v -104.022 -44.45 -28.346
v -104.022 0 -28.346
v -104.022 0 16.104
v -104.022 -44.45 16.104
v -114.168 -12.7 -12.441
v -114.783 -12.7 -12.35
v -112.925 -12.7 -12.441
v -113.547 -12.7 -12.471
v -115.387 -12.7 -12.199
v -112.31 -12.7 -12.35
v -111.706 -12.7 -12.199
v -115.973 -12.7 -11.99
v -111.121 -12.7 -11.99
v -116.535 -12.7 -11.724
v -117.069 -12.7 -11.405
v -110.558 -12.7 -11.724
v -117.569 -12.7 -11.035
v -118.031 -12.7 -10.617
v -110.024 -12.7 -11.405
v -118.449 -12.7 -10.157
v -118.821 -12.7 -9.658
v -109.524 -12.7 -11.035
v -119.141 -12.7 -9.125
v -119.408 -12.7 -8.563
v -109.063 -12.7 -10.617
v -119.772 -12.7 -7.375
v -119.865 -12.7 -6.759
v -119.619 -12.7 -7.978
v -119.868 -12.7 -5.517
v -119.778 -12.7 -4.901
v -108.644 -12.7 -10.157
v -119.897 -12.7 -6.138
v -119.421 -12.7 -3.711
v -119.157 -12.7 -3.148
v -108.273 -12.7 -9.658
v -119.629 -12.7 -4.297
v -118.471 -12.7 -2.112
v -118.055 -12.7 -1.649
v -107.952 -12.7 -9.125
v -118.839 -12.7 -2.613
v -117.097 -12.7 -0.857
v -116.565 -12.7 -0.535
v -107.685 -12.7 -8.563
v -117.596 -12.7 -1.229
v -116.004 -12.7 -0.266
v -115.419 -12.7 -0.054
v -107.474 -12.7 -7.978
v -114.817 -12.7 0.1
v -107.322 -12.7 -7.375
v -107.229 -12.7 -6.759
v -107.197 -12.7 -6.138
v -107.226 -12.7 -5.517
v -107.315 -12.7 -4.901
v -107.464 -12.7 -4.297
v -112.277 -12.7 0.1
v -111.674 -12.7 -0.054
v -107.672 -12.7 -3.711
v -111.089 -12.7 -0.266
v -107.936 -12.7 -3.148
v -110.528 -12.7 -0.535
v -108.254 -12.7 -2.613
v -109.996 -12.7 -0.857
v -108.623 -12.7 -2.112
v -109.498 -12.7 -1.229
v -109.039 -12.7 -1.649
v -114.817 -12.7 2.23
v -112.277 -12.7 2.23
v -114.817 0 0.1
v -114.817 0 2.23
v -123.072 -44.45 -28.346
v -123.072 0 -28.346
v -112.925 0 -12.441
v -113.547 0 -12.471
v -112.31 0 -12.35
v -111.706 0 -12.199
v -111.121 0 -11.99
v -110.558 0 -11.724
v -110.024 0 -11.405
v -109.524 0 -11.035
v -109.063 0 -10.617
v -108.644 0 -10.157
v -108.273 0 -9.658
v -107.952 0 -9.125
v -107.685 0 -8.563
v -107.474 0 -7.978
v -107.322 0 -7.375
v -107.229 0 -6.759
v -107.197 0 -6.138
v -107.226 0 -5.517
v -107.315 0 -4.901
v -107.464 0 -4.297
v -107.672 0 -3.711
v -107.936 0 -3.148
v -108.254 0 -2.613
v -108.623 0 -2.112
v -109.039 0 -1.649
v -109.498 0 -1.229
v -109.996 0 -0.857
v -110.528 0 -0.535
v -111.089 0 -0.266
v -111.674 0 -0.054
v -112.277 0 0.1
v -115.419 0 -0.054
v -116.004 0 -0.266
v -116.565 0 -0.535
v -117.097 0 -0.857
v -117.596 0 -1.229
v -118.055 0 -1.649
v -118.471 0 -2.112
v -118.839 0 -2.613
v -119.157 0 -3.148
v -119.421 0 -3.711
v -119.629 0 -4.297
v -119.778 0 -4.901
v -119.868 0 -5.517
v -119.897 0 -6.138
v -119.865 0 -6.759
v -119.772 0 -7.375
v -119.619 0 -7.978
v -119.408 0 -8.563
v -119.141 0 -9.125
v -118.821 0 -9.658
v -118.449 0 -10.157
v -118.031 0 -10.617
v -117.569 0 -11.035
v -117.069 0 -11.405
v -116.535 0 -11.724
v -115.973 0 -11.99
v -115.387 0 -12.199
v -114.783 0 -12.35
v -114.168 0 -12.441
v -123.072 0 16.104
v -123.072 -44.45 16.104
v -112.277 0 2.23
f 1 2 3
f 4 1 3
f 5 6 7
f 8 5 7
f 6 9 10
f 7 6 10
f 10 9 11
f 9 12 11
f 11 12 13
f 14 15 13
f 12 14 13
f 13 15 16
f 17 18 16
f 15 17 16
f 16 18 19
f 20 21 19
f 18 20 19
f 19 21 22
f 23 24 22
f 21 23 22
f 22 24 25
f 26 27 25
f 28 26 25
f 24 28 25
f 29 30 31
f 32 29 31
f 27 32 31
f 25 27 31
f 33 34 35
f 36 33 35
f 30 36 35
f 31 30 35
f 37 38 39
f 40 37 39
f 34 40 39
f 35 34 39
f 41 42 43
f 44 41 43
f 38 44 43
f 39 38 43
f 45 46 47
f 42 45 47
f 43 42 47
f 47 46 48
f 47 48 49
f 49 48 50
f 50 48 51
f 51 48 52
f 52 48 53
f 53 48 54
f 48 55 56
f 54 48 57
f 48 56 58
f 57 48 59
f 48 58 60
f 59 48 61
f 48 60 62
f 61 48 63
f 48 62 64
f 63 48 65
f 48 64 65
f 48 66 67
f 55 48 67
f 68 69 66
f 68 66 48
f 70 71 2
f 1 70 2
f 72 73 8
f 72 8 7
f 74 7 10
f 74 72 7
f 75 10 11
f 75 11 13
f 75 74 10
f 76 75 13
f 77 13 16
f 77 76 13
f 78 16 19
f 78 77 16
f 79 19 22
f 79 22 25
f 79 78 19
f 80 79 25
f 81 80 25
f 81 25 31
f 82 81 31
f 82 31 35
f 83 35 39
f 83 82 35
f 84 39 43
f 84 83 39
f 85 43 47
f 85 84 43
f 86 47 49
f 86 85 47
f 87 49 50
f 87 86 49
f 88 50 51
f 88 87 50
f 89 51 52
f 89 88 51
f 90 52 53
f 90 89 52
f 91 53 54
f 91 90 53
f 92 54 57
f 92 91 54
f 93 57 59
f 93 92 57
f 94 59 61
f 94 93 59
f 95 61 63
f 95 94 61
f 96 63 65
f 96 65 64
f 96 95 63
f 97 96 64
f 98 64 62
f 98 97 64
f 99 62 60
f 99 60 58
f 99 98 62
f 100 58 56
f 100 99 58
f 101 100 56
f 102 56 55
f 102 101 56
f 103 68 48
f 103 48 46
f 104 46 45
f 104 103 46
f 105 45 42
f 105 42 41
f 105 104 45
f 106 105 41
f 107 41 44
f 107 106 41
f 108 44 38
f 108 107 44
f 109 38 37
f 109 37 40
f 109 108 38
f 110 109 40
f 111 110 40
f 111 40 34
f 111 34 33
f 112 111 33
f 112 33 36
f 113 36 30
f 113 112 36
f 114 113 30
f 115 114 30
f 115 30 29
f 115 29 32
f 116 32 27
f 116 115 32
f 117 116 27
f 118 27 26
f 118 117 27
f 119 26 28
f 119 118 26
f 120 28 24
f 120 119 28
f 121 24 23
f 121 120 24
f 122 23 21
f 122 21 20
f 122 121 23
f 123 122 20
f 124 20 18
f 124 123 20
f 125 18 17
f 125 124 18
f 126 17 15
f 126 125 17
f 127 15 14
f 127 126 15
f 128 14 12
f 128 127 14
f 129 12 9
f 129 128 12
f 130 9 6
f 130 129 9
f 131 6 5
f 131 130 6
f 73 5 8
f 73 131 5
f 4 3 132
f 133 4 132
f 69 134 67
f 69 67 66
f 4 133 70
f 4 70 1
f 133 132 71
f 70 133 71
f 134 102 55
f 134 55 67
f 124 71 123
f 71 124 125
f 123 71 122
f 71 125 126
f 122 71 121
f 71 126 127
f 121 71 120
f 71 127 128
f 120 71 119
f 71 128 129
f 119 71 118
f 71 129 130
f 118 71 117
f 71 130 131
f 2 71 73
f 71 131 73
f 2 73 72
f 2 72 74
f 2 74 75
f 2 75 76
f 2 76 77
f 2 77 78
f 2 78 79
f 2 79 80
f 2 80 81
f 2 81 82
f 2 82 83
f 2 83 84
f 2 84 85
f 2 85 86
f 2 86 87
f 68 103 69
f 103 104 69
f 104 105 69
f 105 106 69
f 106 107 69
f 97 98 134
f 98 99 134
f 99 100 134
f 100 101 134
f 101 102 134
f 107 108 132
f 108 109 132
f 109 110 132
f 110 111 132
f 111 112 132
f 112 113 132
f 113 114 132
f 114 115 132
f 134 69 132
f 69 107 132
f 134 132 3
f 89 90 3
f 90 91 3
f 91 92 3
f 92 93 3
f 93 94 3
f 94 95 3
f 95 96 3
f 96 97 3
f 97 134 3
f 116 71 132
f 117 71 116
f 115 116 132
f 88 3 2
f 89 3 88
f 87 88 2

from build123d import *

# Parameters (mm, degrees)
F1_DEPTH = 44.45
F2_DEPTH = 12.7


with BuildPart() as f1:
    # F0 (on Front) → F1 (new body)
    with BuildSketch(Plane.XZ):
        with BuildLine():
            ThreePointArc((-113.546669, -12.471259), (-119.864514, -6.759491), (-114.816669, 0.100445))
            Line((-114.816669, 0.100445), (-114.816669, 2.230411))
            Line((-114.816669, 2.230411), (-113.546669, 2.230411))
            Line((-113.546669, 2.230411), (-113.546669, 16.103741))
            Line((-113.546669, 16.103741), (-123.071669, 16.103741))
            Line((-123.071669, 16.103741), (-123.071669, -28.346259))
            Line((-123.071669, -28.346259), (-113.546669, -28.346259))
            Line((-113.546669, -28.346259), (-113.546669, -12.471259))
        make_face()
        with BuildLine():
            ThreePointArc((-112.276669, 0.100445), (-107.228825, -6.759491), (-113.546669, -12.471259))
            Line((-113.546669, -12.471259), (-113.546669, -28.346259))
            Line((-113.546669, -28.346259), (-104.021669, -28.346259))
            Line((-104.021669, -28.346259), (-104.021669, 16.103741))
            Line((-104.021669, 16.103741), (-113.546669, 16.103741))
            Line((-113.546669, 16.103741), (-113.546669, 2.230411))
            Line((-113.546669, 2.230411), (-112.276669, 2.230411))
            Line((-112.276669, 2.230411), (-112.276669, 0.100445))
        make_face()
        with BuildLine():
            Line((-113.546669, -6.121259), (-113.546669, -12.471259))
            ThreePointArc((-113.546669, -12.471259), (-107.228825, -6.759491), (-112.276669, 0.100445))
            Line((-112.276669, 0.100445), (-112.276669, 2.230411))
            Line((-112.276669, 2.230411), (-113.546669, 2.230411))
            Line((-113.546669, 2.230411), (-113.546669, -6.121259))
        make_face()
        with BuildLine():
            Line((-114.816669, 2.230411), (-114.816669, 0.100445))
            ThreePointArc((-114.816669, 0.100445), (-119.864514, -6.759491), (-113.546669, -12.471259))
            Line((-113.546669, -12.471259), (-113.546669, -6.121259))
            Line((-113.546669, -6.121259), (-113.546669, 2.230411))
            Line((-113.546669, 2.230411), (-114.816669, 2.230411))
        make_face()
    extrude(amount=F1_DEPTH)

    # F0 (on Front) → F2 (cut)
    with BuildSketch(Plane.XZ):
        with BuildLine():
            Line((-113.546669, -6.121259), (-113.546669, -12.471259))
            ThreePointArc((-113.546669, -12.471259), (-107.228825, -6.759491), (-112.276669, 0.100445))
            Line((-112.276669, 0.100445), (-112.276669, 2.230411))
            Line((-112.276669, 2.230411), (-113.546669, 2.230411))
            Line((-113.546669, 2.230411), (-113.546669, -6.121259))
        make_face()
        with BuildLine():
            Line((-114.816669, 2.230411), (-114.816669, 0.100445))
            ThreePointArc((-114.816669, 0.100445), (-119.864514, -6.759491), (-113.546669, -12.471259))
            Line((-113.546669, -12.471259), (-113.546669, -6.121259))
            Line((-113.546669, -6.121259), (-113.546669, 2.230411))
            Line((-113.546669, 2.230411), (-114.816669, 2.230411))
        make_face()
    extrude(amount=F2_DEPTH, mode=Mode.SUBTRACT)


solid = f1.part
